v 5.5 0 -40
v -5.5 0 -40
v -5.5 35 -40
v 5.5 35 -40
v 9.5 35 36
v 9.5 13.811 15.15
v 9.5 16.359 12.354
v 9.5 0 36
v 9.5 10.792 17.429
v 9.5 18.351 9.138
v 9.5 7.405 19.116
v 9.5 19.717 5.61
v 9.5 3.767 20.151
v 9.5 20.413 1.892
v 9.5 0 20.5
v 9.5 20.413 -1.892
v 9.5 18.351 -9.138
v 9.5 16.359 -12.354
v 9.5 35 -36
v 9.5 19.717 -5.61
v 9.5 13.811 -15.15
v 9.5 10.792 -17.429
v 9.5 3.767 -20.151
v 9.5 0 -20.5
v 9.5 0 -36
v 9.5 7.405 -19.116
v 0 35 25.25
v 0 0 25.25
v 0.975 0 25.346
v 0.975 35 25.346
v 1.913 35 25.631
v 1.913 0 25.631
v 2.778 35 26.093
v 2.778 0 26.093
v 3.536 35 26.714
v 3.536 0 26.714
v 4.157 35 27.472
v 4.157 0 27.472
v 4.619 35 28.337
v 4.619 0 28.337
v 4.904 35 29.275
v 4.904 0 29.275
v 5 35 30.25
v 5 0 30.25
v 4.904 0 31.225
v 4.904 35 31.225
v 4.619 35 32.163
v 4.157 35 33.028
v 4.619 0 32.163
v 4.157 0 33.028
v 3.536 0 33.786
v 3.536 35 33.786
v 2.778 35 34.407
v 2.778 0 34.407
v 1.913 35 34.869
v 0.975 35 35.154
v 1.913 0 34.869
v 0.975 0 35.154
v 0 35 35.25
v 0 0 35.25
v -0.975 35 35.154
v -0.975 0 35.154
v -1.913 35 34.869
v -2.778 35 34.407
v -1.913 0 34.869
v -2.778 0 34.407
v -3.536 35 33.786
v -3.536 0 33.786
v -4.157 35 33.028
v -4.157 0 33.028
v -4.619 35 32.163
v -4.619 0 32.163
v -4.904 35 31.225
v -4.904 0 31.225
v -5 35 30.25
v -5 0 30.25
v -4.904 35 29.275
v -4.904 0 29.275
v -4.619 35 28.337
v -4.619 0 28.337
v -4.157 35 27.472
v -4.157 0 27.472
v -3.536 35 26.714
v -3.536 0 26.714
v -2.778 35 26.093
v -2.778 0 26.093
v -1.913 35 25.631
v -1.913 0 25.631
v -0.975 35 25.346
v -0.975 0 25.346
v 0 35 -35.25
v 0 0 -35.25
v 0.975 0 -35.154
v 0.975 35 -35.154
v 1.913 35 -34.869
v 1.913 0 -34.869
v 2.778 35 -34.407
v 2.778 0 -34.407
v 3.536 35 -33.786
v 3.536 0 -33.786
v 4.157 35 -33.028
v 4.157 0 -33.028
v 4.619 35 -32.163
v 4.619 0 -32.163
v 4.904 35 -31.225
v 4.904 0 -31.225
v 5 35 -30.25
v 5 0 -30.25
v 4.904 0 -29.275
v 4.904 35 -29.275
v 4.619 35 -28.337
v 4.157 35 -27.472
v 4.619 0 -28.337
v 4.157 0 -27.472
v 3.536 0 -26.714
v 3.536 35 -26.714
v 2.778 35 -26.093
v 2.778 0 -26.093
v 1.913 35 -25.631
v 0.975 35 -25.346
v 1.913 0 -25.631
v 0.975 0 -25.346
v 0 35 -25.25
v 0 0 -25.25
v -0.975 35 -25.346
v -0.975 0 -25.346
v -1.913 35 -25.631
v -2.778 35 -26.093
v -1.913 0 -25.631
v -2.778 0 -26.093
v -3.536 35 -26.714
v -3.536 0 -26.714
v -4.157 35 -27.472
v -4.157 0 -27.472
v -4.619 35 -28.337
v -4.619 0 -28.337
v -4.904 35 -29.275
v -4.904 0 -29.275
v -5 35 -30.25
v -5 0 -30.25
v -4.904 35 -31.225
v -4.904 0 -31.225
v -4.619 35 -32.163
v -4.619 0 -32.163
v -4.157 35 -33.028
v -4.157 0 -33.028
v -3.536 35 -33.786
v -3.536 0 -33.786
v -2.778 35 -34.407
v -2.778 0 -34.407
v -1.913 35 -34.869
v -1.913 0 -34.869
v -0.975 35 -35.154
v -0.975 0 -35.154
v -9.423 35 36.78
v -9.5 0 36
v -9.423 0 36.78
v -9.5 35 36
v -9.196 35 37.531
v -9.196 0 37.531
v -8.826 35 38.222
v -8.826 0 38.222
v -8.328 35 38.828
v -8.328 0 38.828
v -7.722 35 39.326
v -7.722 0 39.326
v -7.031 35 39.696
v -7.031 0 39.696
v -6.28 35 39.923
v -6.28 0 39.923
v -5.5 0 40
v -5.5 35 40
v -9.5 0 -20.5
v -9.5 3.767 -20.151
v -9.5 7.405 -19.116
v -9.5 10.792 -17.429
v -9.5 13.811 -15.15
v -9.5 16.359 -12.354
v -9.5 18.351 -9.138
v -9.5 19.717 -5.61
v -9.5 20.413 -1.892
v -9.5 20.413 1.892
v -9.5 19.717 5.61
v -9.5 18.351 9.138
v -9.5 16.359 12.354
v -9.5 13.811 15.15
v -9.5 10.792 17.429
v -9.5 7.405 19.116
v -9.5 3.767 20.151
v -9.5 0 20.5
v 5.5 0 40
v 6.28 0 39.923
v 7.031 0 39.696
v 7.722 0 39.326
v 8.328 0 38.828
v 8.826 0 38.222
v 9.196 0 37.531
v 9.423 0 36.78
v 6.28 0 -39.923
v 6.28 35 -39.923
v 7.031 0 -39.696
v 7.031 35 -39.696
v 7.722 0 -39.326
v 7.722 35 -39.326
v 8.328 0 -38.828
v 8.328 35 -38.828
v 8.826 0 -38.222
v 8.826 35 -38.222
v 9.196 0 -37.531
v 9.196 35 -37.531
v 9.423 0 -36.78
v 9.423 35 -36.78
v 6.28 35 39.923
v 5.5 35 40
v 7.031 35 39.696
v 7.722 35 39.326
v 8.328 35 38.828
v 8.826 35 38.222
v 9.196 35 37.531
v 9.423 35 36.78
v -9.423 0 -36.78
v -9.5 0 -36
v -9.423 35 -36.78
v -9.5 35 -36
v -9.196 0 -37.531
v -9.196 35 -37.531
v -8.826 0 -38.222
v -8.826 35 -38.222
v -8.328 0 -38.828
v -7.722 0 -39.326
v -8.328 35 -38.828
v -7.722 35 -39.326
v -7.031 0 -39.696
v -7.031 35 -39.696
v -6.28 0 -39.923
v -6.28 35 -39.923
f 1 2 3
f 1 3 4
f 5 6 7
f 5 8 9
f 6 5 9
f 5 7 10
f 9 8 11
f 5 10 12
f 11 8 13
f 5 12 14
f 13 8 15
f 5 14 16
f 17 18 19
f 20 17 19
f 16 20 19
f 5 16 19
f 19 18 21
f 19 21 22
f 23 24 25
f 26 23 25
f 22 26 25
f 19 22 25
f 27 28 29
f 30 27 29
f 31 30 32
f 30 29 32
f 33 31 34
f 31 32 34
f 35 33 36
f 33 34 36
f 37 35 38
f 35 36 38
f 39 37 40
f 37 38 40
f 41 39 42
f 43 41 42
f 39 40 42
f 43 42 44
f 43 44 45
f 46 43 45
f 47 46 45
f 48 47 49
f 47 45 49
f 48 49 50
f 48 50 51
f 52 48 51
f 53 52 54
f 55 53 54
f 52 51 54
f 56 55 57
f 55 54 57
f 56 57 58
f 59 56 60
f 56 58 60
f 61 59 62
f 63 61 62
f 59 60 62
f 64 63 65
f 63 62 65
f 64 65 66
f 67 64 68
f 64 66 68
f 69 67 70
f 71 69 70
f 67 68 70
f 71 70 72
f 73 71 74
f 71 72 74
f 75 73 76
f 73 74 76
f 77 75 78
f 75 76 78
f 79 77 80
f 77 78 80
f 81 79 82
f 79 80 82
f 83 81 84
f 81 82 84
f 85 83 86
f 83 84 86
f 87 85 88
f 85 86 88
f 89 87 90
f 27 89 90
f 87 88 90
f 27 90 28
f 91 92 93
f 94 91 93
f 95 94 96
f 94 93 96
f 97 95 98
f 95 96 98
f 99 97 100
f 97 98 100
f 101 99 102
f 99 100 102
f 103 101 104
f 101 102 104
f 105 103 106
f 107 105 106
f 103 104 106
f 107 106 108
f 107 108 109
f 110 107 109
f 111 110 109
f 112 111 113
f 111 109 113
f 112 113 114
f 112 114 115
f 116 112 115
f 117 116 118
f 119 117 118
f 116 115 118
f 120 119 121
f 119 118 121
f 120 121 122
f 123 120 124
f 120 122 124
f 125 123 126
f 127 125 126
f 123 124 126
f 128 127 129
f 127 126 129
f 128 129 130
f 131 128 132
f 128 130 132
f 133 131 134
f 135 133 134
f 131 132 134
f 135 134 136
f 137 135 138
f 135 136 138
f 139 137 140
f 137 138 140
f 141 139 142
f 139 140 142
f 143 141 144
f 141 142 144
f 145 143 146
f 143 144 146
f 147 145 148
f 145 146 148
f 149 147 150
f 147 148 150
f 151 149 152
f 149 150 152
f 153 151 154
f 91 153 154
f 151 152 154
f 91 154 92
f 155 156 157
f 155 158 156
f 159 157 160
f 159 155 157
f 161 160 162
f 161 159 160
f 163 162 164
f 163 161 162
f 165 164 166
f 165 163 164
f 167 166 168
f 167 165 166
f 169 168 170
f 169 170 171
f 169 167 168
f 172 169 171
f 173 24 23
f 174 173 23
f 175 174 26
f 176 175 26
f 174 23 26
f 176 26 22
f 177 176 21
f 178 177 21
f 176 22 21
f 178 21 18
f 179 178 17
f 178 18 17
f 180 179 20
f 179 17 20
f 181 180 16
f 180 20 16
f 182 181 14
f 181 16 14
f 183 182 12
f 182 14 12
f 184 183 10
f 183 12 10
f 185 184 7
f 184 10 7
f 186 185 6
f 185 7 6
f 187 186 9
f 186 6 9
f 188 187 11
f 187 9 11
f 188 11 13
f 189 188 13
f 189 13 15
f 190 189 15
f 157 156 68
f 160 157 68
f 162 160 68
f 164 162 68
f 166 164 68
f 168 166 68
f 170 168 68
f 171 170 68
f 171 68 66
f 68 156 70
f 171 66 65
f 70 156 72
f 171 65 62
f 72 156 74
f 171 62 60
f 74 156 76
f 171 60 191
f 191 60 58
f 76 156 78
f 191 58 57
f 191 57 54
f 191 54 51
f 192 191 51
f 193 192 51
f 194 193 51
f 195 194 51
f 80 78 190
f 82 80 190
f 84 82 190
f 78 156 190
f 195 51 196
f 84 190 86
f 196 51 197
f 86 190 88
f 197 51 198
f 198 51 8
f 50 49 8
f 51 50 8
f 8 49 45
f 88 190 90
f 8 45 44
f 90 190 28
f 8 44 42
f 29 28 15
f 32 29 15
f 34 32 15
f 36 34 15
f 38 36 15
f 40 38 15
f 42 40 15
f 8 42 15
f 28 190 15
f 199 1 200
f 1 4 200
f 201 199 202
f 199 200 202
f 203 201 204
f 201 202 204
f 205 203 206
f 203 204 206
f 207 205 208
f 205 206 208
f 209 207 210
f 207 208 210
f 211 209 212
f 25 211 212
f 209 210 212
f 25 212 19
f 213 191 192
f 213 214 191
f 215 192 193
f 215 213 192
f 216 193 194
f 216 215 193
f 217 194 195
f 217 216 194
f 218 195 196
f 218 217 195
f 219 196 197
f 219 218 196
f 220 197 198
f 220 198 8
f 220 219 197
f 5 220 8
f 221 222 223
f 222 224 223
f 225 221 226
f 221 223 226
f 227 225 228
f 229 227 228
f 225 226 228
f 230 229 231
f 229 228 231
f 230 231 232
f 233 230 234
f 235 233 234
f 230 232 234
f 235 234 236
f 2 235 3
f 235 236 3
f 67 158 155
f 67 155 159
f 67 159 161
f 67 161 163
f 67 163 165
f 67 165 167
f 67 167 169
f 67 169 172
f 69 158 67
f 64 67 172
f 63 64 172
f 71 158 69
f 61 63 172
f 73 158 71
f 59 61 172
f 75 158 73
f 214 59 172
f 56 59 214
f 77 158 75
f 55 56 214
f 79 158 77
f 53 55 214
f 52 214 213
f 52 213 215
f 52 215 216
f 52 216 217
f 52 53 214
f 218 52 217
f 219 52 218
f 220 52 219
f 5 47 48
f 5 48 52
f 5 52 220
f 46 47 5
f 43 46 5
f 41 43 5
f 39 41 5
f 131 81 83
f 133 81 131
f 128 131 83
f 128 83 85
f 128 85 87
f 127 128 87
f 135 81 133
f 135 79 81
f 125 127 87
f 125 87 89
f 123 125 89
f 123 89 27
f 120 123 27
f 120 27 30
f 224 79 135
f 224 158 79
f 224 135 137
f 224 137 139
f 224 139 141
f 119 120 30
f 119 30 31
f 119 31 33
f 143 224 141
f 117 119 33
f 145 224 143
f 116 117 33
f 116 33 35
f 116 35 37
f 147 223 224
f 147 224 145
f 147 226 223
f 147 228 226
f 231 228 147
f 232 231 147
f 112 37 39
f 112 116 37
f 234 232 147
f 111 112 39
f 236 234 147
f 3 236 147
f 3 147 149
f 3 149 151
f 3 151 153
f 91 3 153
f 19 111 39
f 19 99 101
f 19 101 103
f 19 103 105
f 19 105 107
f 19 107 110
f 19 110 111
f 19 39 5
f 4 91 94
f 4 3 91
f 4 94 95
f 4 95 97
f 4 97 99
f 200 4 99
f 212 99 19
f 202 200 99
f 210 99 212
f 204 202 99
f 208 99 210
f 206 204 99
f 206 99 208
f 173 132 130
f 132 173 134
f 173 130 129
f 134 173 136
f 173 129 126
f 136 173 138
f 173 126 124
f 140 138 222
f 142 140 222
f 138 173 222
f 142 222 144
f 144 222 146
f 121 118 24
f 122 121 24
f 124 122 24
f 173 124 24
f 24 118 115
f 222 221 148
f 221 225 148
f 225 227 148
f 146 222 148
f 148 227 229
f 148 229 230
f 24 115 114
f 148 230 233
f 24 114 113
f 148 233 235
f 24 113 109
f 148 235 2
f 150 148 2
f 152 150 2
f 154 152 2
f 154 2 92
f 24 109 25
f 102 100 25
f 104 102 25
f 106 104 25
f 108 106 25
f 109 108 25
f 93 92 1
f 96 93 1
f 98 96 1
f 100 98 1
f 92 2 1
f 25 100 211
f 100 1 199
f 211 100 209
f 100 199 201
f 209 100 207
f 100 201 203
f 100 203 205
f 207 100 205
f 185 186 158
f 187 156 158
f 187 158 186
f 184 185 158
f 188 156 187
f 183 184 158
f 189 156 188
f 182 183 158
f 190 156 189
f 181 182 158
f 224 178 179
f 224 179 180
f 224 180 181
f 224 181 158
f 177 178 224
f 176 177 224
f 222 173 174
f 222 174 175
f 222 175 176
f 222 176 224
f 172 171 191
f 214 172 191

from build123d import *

# Parameters (mm, degrees)
SKETCH1_W           = 19
SKETCH1_H           = 80
BOSS_EXTRUDE1_DEPTH = 35
CUT_EXTRUDE1_DEPTH  = 35
SKETCH3_R           = 5
CUT_EXTRUDE2_DEPTH  = 35
FILLET1_R           = 4


with BuildPart() as part:
    # Sketch1 → Boss-Extrude1 (new body)
    with BuildSketch(Plane(origin=(0, 0, 0), x_dir=(1, 0, 0), z_dir=(0, 1, 0))):
        Rectangle(SKETCH1_W, SKETCH1_H)
    extrude(amount=BOSS_EXTRUDE1_DEPTH)

    # Sketch2 → Cut-Extrude1 (cut)
    with BuildSketch(Plane(origin=(9.5, 0, 0), x_dir=(0, 0, -1), z_dir=(1, 0, 0))):
        with BuildLine():
            ThreePointArc((20.5, 0), (0, 20.5), (-20.5, 0))
            Line((-20.5, 0), (20.5, 0))
        make_face()
        with BuildLine():
            Line((20.5, 0), (-20.5, 0))
            ThreePointArc((-20.5, 0), (0, -20.5), (20.5, 0))
        make_face()
    extrude(amount=-CUT_EXTRUDE1_DEPTH, mode=Mode.SUBTRACT)

    # Sketch3 → Cut-Extrude2 (cut)
    with BuildSketch(Plane.XZ):
        with Locations(Location((0, -30.25, 0), (0, 0, 270))):
            Circle(SKETCH3_R)
        with Locations(Location((0, 30.25, 0), (0, 0, 270))):
            Circle(SKETCH3_R)
    extrude(amount=-CUT_EXTRUDE2_DEPTH, mode=Mode.SUBTRACT)

    # Fillet1
    fillet1_edges = [part.edges().sort_by_distance(p)[0] for p in [
        (9.5, 17.5, 40),
        (-9.5, 17.5, 40),
        (-9.5, 17.5, -40),
        (9.5, 17.5, -40),
    ]]
    fillet(fillet1_edges, radius=FILLET1_R)


solid = part.part
